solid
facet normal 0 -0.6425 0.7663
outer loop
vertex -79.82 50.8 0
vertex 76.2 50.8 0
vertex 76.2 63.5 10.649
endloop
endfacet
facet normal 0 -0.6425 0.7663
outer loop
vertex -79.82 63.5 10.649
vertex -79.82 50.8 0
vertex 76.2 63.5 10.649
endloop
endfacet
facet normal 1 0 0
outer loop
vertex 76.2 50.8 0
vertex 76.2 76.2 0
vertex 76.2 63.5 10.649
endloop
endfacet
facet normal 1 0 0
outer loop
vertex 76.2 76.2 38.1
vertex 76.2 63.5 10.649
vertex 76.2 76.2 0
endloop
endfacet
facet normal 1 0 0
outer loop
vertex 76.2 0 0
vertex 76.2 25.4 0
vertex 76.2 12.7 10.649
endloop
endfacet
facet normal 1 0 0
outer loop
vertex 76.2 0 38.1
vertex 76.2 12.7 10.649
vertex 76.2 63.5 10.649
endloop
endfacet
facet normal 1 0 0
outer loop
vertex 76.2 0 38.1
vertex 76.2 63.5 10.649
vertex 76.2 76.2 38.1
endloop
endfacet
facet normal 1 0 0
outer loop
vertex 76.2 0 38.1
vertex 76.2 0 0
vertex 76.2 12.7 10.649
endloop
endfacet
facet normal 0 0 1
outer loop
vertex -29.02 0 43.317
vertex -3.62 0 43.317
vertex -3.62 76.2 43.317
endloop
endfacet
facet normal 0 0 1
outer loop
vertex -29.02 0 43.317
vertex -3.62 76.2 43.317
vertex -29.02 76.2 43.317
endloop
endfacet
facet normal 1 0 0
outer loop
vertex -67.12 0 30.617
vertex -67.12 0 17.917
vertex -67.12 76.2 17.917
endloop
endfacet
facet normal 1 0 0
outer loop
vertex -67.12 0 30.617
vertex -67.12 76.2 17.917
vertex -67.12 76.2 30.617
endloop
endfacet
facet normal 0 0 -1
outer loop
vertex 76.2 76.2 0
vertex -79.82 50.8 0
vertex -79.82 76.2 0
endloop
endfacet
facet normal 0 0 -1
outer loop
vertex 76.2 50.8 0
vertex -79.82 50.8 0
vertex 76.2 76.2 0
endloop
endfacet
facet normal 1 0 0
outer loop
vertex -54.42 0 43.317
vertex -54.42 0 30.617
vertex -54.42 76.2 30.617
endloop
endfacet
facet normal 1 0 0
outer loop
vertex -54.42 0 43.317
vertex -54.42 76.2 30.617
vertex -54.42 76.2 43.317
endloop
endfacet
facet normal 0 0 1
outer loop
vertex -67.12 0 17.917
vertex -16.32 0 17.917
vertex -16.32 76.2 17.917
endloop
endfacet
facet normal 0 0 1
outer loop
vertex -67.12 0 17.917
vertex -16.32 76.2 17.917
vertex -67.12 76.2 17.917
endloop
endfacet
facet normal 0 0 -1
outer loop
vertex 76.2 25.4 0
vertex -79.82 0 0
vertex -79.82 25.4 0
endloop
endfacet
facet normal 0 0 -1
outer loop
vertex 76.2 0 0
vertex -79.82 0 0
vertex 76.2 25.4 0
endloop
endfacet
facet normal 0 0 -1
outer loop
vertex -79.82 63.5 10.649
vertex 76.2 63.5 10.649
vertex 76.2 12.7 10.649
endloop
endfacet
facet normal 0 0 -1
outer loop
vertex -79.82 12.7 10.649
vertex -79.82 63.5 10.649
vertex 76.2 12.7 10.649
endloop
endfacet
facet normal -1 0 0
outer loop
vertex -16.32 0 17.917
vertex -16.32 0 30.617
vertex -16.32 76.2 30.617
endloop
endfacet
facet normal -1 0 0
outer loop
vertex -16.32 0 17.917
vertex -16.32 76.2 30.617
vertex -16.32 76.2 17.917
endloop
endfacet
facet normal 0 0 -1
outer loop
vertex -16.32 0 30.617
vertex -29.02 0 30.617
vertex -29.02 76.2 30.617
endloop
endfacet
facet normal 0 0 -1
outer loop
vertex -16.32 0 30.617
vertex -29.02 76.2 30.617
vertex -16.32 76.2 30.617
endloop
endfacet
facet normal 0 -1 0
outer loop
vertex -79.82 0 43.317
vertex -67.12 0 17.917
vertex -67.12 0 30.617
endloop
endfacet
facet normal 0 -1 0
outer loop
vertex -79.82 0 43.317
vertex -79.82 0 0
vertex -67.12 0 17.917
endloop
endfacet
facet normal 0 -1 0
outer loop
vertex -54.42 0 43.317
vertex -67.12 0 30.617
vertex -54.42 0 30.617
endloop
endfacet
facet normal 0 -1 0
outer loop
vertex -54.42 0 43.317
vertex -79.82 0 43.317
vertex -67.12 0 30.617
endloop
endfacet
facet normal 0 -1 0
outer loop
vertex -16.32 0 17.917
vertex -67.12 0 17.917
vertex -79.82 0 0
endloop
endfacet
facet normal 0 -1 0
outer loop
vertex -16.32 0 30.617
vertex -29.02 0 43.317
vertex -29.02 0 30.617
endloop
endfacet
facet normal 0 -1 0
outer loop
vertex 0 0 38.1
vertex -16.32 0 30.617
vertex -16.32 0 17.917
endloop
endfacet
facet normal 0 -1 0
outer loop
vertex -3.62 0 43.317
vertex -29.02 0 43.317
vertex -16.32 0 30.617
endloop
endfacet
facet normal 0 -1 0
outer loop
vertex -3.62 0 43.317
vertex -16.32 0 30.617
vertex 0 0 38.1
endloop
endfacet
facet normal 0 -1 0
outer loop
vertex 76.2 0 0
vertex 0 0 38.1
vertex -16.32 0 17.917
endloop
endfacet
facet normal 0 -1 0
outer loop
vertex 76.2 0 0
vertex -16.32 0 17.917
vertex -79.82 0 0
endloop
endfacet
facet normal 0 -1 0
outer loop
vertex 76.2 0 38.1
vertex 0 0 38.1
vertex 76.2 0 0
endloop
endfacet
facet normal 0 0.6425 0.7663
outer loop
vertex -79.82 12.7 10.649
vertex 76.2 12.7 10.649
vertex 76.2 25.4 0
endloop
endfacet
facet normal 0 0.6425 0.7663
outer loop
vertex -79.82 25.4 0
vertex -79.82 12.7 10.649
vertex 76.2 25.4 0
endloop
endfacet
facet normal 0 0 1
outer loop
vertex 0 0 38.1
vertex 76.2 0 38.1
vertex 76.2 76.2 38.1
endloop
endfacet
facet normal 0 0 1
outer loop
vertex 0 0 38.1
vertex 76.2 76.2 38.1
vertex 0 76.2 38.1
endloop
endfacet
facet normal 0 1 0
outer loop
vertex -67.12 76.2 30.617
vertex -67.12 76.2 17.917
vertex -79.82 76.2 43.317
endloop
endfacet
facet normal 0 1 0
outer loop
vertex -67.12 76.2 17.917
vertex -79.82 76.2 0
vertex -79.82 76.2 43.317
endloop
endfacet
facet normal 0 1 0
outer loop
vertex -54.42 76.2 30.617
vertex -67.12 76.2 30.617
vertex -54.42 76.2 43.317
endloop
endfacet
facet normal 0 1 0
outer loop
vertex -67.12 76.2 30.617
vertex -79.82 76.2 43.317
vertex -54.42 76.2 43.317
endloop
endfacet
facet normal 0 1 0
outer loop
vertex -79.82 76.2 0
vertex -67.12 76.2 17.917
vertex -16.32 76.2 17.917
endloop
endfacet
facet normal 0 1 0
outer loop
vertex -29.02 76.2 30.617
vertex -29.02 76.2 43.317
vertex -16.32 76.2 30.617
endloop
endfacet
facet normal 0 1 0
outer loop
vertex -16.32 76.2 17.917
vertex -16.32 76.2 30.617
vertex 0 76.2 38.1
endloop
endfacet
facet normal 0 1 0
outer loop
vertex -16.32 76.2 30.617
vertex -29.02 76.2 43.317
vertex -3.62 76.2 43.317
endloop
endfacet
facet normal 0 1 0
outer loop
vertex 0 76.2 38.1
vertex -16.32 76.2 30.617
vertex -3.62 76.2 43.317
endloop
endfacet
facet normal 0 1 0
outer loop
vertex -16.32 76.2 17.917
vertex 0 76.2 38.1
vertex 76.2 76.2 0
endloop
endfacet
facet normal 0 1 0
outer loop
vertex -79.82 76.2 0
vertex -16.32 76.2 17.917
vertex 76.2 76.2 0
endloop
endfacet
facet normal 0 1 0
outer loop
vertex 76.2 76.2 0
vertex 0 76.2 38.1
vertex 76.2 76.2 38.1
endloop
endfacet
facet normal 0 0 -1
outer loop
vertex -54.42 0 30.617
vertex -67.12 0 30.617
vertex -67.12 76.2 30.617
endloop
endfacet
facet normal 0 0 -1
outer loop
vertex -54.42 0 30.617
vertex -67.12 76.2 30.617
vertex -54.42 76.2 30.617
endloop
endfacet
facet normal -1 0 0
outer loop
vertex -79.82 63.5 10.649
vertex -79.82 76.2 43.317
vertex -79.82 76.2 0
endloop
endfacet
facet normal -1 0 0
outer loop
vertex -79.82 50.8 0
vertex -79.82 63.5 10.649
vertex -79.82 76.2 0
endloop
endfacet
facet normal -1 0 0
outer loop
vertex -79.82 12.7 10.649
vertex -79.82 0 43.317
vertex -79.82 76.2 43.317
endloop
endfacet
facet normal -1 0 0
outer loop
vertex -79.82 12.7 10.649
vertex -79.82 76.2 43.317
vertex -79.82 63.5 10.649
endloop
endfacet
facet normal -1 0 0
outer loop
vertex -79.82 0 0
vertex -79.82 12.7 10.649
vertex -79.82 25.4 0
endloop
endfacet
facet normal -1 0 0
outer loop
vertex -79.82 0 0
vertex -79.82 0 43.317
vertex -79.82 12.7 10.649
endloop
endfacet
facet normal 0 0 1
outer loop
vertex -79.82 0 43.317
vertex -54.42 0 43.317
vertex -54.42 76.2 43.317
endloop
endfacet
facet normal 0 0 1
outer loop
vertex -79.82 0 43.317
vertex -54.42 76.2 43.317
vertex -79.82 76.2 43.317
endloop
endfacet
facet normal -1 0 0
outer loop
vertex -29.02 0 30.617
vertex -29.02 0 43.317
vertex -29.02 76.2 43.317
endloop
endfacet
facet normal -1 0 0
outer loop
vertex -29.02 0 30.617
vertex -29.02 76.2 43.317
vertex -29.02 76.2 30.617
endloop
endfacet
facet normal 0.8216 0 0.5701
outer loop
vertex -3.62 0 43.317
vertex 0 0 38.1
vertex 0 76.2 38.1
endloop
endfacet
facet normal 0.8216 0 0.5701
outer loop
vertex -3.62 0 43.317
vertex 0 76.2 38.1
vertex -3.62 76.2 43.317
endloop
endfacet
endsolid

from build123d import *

# Parameters (mm, degrees)
F1_DEPTH = 76.2
F3_DEPTH = 156.01986


with BuildPart() as f1:
    # F0 (on Front) → F1 (new body)
    with BuildSketch(Plane.XZ):
        Polygon((-76.2, 0), (0, 0), (76.2, 0), (76.2, 38.1), (0, 38.1), (-3.61986, 43.317194), (-29.01986, 43.317194), (-29.01986, 30.617194), (-16.31986, 30.617194), (-16.31986, 17.917194), (-67.11986, 17.917194), (-67.11986, 30.617194), (-54.41986, 30.617194), (-54.41986, 43.317194), (-79.81986, 43.317194), (-79.81986, 0), align=None)
    extrude(amount=-F1_DEPTH)

    # F2 (on face) → F3 (cut, through all)
    with BuildSketch(Plane.YZ.offset(76.2)):
        Polygon((63.5, 10.648813), (12.7, 10.648813), (25.4, 0), (50.8, 0), align=None)
    extrude(amount=-F3_DEPTH, mode=Mode.SUBTRACT)


solid = f1.part
